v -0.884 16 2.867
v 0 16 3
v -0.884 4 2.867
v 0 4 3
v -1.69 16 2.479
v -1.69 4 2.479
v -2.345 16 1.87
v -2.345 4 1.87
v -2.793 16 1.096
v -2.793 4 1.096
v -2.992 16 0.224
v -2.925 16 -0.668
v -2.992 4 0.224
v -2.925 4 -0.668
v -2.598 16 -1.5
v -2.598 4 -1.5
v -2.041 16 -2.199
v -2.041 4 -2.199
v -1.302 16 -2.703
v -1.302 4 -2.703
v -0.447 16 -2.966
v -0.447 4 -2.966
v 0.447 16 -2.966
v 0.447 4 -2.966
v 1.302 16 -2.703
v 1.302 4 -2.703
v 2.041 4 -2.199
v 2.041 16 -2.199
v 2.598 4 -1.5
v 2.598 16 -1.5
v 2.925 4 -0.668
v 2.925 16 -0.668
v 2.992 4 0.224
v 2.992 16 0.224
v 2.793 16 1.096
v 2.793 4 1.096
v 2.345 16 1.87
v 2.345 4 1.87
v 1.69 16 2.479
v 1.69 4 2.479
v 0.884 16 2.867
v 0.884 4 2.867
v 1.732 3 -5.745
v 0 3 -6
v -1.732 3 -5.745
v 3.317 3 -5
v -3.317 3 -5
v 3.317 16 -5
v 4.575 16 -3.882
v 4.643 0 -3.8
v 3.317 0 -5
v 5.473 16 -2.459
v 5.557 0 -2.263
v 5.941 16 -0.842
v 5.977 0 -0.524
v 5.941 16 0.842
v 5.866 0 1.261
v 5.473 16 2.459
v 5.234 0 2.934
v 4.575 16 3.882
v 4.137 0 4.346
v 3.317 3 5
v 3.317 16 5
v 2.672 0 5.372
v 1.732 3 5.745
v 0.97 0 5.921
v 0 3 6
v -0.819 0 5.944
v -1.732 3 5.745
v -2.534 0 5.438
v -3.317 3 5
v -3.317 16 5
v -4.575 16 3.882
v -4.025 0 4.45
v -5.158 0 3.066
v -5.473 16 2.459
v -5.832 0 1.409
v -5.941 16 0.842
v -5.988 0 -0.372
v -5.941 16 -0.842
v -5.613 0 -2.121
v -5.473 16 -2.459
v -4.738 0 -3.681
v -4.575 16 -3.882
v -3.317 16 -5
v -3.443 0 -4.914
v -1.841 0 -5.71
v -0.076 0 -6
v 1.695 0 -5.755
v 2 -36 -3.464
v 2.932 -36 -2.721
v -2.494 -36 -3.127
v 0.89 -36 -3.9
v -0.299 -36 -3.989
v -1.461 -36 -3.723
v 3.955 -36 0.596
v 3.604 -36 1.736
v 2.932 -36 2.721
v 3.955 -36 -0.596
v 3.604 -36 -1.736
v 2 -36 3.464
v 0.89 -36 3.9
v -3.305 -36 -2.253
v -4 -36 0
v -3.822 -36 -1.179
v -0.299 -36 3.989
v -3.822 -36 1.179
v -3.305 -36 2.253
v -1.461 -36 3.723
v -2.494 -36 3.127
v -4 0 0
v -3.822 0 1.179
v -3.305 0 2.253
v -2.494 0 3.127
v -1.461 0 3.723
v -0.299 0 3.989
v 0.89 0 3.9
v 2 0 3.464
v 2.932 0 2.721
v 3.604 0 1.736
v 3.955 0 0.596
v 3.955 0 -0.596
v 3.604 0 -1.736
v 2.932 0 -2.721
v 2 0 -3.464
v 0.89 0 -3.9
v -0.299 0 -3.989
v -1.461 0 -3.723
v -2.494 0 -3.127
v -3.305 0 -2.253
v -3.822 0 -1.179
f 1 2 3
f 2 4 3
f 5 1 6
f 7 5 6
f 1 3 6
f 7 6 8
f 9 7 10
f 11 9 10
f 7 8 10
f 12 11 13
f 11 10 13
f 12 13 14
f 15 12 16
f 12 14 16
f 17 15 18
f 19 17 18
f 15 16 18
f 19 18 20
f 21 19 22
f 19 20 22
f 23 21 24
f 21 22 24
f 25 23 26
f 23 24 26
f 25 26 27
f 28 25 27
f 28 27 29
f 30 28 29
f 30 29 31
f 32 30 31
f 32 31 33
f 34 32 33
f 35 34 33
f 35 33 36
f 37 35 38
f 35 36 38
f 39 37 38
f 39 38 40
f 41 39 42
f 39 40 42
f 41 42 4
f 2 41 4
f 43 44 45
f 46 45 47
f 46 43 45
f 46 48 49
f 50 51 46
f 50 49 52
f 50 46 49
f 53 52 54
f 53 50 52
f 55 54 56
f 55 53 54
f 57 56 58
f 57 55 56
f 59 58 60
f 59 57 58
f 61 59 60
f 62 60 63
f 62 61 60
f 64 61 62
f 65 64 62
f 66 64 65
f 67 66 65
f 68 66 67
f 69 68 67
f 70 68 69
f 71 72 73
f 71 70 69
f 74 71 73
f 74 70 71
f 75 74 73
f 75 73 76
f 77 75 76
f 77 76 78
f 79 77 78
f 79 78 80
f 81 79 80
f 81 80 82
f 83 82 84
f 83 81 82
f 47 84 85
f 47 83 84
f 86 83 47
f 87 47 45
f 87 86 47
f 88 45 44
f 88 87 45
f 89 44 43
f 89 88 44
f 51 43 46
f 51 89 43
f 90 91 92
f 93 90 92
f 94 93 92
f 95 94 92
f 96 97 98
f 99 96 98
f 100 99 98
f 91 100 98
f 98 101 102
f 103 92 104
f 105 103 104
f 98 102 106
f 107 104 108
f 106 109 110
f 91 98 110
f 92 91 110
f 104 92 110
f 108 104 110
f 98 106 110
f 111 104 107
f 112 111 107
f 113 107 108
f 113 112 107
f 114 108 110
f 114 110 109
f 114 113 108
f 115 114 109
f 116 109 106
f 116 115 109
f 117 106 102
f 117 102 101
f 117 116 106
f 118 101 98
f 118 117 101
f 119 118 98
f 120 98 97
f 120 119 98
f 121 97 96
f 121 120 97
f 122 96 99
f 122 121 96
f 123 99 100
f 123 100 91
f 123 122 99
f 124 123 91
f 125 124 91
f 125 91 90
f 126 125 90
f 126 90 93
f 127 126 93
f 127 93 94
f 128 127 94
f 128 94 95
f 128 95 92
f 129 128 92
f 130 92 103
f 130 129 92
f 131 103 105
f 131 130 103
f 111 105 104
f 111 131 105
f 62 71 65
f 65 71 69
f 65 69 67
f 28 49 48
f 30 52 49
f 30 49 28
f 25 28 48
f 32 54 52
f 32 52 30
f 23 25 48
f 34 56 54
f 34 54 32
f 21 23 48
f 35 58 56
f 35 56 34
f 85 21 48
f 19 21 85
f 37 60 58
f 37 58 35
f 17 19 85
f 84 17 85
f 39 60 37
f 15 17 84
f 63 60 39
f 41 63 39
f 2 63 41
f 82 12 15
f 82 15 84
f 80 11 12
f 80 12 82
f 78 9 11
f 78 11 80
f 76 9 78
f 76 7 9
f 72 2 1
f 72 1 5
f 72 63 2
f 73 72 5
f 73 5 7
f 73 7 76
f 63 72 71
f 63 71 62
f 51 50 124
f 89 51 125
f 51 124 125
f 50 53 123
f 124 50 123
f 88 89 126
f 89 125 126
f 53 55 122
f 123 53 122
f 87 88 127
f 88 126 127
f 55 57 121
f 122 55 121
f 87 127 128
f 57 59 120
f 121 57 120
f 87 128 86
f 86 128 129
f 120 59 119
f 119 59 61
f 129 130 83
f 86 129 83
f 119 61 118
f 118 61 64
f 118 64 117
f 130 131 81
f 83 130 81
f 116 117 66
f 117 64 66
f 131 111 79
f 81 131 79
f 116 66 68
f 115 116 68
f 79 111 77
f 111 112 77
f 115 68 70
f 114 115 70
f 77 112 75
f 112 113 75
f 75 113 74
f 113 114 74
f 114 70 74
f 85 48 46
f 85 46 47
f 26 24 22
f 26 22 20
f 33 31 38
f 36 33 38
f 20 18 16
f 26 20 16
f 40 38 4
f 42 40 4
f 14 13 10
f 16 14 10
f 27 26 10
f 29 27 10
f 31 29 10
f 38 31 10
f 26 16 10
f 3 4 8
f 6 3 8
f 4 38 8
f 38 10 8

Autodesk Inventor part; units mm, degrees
ref_plane "YZ Plane" through (0, 0, 0) normal (1, 0, 0) x (0, 1, 0)
ref_plane "XZ Plane" through (0, 0, 0) normal (0, 1, 0) x (-1, 0, 0)
ref_plane "XY Plane" through (0, 0, 0) normal (0, 0, 1) x (1, 0, 0)
sketch "Sketch1" plane through (0, 0, 0) normal (0, 1, 0) x (-1, 0, 0)
  arc A0 (3.3166, 5) -> (-3.3166, -5) centre (0, 0) ccw
  line L0 (3.3166, 5) -> (-3.3166, 5) construction
  line L1 (3.3166, -5) -> (-3.3166, -5) construction
  arc A1 (3.3166, 5) -> (-3.3166, 5) centre (0, 0) ccw construction
  arc A2 (3.3166, -5) -> (3.3166, 5) centre (0, 0) ccw
  arc A3 (-3.3166, -5) -> (3.3166, -5) centre (0, 0) ccw
  line L2 (0, 0) -> (18.76, 0) construction
  point P0 (5.7735, 0)
  dimension "d17" = 10
  dimension "d18" = 12
extrude "Extrusion1" add sketch "Sketch1" along normal blind 16
sketch "Sketch2" plane through (0, 0, 0) normal (0, 1, 0) x (-1, 0, 0)
  circle A0 centre (0, 0) radius 4
  dimension "d3" = 8
extrude "Extrusion2" add sketch "Sketch2" against normal blind 36
thread "Thread1" size "M8x1.25" class "6g" standard "ANSI Metric M Profile" length 16
sketch "Sketch4" plane through (0, 16, 0) normal (0, 1, 0) x (1, 0, 0)
  circle A0 centre (0, 0) radius 6 construction
  line L0 (-3.3166, -5) -> (3.3166, -5)
  line L1 (3.3166, 5) -> (-3.3166, 5)
  arc A1 (-3.3166, -5) -> (3.3166, -5) centre (0, 0) ccw
  arc A2 (3.3166, 5) -> (-3.3166, 5) centre (0, 0) ccw
  dimension "d20" = 10
extrude "Extrusion3" cut sketch "Sketch4" against normal blind 13
sketch "Sketch3" plane through (0, 16, 0) normal (0, 1, 0) x (1, 0, 0)
  point P0 (0, 0)
  point P1 (0, 0)
hole "Hole1" at (0, 16, 0) direction (0, -1, 0) diameter 6 depth 12
thread "Thread2" size "M6x1" class "6H" standard "ANSI Metric M Profile" full length
properties part number "BallTransferUnit" material "Stainless Steel"
